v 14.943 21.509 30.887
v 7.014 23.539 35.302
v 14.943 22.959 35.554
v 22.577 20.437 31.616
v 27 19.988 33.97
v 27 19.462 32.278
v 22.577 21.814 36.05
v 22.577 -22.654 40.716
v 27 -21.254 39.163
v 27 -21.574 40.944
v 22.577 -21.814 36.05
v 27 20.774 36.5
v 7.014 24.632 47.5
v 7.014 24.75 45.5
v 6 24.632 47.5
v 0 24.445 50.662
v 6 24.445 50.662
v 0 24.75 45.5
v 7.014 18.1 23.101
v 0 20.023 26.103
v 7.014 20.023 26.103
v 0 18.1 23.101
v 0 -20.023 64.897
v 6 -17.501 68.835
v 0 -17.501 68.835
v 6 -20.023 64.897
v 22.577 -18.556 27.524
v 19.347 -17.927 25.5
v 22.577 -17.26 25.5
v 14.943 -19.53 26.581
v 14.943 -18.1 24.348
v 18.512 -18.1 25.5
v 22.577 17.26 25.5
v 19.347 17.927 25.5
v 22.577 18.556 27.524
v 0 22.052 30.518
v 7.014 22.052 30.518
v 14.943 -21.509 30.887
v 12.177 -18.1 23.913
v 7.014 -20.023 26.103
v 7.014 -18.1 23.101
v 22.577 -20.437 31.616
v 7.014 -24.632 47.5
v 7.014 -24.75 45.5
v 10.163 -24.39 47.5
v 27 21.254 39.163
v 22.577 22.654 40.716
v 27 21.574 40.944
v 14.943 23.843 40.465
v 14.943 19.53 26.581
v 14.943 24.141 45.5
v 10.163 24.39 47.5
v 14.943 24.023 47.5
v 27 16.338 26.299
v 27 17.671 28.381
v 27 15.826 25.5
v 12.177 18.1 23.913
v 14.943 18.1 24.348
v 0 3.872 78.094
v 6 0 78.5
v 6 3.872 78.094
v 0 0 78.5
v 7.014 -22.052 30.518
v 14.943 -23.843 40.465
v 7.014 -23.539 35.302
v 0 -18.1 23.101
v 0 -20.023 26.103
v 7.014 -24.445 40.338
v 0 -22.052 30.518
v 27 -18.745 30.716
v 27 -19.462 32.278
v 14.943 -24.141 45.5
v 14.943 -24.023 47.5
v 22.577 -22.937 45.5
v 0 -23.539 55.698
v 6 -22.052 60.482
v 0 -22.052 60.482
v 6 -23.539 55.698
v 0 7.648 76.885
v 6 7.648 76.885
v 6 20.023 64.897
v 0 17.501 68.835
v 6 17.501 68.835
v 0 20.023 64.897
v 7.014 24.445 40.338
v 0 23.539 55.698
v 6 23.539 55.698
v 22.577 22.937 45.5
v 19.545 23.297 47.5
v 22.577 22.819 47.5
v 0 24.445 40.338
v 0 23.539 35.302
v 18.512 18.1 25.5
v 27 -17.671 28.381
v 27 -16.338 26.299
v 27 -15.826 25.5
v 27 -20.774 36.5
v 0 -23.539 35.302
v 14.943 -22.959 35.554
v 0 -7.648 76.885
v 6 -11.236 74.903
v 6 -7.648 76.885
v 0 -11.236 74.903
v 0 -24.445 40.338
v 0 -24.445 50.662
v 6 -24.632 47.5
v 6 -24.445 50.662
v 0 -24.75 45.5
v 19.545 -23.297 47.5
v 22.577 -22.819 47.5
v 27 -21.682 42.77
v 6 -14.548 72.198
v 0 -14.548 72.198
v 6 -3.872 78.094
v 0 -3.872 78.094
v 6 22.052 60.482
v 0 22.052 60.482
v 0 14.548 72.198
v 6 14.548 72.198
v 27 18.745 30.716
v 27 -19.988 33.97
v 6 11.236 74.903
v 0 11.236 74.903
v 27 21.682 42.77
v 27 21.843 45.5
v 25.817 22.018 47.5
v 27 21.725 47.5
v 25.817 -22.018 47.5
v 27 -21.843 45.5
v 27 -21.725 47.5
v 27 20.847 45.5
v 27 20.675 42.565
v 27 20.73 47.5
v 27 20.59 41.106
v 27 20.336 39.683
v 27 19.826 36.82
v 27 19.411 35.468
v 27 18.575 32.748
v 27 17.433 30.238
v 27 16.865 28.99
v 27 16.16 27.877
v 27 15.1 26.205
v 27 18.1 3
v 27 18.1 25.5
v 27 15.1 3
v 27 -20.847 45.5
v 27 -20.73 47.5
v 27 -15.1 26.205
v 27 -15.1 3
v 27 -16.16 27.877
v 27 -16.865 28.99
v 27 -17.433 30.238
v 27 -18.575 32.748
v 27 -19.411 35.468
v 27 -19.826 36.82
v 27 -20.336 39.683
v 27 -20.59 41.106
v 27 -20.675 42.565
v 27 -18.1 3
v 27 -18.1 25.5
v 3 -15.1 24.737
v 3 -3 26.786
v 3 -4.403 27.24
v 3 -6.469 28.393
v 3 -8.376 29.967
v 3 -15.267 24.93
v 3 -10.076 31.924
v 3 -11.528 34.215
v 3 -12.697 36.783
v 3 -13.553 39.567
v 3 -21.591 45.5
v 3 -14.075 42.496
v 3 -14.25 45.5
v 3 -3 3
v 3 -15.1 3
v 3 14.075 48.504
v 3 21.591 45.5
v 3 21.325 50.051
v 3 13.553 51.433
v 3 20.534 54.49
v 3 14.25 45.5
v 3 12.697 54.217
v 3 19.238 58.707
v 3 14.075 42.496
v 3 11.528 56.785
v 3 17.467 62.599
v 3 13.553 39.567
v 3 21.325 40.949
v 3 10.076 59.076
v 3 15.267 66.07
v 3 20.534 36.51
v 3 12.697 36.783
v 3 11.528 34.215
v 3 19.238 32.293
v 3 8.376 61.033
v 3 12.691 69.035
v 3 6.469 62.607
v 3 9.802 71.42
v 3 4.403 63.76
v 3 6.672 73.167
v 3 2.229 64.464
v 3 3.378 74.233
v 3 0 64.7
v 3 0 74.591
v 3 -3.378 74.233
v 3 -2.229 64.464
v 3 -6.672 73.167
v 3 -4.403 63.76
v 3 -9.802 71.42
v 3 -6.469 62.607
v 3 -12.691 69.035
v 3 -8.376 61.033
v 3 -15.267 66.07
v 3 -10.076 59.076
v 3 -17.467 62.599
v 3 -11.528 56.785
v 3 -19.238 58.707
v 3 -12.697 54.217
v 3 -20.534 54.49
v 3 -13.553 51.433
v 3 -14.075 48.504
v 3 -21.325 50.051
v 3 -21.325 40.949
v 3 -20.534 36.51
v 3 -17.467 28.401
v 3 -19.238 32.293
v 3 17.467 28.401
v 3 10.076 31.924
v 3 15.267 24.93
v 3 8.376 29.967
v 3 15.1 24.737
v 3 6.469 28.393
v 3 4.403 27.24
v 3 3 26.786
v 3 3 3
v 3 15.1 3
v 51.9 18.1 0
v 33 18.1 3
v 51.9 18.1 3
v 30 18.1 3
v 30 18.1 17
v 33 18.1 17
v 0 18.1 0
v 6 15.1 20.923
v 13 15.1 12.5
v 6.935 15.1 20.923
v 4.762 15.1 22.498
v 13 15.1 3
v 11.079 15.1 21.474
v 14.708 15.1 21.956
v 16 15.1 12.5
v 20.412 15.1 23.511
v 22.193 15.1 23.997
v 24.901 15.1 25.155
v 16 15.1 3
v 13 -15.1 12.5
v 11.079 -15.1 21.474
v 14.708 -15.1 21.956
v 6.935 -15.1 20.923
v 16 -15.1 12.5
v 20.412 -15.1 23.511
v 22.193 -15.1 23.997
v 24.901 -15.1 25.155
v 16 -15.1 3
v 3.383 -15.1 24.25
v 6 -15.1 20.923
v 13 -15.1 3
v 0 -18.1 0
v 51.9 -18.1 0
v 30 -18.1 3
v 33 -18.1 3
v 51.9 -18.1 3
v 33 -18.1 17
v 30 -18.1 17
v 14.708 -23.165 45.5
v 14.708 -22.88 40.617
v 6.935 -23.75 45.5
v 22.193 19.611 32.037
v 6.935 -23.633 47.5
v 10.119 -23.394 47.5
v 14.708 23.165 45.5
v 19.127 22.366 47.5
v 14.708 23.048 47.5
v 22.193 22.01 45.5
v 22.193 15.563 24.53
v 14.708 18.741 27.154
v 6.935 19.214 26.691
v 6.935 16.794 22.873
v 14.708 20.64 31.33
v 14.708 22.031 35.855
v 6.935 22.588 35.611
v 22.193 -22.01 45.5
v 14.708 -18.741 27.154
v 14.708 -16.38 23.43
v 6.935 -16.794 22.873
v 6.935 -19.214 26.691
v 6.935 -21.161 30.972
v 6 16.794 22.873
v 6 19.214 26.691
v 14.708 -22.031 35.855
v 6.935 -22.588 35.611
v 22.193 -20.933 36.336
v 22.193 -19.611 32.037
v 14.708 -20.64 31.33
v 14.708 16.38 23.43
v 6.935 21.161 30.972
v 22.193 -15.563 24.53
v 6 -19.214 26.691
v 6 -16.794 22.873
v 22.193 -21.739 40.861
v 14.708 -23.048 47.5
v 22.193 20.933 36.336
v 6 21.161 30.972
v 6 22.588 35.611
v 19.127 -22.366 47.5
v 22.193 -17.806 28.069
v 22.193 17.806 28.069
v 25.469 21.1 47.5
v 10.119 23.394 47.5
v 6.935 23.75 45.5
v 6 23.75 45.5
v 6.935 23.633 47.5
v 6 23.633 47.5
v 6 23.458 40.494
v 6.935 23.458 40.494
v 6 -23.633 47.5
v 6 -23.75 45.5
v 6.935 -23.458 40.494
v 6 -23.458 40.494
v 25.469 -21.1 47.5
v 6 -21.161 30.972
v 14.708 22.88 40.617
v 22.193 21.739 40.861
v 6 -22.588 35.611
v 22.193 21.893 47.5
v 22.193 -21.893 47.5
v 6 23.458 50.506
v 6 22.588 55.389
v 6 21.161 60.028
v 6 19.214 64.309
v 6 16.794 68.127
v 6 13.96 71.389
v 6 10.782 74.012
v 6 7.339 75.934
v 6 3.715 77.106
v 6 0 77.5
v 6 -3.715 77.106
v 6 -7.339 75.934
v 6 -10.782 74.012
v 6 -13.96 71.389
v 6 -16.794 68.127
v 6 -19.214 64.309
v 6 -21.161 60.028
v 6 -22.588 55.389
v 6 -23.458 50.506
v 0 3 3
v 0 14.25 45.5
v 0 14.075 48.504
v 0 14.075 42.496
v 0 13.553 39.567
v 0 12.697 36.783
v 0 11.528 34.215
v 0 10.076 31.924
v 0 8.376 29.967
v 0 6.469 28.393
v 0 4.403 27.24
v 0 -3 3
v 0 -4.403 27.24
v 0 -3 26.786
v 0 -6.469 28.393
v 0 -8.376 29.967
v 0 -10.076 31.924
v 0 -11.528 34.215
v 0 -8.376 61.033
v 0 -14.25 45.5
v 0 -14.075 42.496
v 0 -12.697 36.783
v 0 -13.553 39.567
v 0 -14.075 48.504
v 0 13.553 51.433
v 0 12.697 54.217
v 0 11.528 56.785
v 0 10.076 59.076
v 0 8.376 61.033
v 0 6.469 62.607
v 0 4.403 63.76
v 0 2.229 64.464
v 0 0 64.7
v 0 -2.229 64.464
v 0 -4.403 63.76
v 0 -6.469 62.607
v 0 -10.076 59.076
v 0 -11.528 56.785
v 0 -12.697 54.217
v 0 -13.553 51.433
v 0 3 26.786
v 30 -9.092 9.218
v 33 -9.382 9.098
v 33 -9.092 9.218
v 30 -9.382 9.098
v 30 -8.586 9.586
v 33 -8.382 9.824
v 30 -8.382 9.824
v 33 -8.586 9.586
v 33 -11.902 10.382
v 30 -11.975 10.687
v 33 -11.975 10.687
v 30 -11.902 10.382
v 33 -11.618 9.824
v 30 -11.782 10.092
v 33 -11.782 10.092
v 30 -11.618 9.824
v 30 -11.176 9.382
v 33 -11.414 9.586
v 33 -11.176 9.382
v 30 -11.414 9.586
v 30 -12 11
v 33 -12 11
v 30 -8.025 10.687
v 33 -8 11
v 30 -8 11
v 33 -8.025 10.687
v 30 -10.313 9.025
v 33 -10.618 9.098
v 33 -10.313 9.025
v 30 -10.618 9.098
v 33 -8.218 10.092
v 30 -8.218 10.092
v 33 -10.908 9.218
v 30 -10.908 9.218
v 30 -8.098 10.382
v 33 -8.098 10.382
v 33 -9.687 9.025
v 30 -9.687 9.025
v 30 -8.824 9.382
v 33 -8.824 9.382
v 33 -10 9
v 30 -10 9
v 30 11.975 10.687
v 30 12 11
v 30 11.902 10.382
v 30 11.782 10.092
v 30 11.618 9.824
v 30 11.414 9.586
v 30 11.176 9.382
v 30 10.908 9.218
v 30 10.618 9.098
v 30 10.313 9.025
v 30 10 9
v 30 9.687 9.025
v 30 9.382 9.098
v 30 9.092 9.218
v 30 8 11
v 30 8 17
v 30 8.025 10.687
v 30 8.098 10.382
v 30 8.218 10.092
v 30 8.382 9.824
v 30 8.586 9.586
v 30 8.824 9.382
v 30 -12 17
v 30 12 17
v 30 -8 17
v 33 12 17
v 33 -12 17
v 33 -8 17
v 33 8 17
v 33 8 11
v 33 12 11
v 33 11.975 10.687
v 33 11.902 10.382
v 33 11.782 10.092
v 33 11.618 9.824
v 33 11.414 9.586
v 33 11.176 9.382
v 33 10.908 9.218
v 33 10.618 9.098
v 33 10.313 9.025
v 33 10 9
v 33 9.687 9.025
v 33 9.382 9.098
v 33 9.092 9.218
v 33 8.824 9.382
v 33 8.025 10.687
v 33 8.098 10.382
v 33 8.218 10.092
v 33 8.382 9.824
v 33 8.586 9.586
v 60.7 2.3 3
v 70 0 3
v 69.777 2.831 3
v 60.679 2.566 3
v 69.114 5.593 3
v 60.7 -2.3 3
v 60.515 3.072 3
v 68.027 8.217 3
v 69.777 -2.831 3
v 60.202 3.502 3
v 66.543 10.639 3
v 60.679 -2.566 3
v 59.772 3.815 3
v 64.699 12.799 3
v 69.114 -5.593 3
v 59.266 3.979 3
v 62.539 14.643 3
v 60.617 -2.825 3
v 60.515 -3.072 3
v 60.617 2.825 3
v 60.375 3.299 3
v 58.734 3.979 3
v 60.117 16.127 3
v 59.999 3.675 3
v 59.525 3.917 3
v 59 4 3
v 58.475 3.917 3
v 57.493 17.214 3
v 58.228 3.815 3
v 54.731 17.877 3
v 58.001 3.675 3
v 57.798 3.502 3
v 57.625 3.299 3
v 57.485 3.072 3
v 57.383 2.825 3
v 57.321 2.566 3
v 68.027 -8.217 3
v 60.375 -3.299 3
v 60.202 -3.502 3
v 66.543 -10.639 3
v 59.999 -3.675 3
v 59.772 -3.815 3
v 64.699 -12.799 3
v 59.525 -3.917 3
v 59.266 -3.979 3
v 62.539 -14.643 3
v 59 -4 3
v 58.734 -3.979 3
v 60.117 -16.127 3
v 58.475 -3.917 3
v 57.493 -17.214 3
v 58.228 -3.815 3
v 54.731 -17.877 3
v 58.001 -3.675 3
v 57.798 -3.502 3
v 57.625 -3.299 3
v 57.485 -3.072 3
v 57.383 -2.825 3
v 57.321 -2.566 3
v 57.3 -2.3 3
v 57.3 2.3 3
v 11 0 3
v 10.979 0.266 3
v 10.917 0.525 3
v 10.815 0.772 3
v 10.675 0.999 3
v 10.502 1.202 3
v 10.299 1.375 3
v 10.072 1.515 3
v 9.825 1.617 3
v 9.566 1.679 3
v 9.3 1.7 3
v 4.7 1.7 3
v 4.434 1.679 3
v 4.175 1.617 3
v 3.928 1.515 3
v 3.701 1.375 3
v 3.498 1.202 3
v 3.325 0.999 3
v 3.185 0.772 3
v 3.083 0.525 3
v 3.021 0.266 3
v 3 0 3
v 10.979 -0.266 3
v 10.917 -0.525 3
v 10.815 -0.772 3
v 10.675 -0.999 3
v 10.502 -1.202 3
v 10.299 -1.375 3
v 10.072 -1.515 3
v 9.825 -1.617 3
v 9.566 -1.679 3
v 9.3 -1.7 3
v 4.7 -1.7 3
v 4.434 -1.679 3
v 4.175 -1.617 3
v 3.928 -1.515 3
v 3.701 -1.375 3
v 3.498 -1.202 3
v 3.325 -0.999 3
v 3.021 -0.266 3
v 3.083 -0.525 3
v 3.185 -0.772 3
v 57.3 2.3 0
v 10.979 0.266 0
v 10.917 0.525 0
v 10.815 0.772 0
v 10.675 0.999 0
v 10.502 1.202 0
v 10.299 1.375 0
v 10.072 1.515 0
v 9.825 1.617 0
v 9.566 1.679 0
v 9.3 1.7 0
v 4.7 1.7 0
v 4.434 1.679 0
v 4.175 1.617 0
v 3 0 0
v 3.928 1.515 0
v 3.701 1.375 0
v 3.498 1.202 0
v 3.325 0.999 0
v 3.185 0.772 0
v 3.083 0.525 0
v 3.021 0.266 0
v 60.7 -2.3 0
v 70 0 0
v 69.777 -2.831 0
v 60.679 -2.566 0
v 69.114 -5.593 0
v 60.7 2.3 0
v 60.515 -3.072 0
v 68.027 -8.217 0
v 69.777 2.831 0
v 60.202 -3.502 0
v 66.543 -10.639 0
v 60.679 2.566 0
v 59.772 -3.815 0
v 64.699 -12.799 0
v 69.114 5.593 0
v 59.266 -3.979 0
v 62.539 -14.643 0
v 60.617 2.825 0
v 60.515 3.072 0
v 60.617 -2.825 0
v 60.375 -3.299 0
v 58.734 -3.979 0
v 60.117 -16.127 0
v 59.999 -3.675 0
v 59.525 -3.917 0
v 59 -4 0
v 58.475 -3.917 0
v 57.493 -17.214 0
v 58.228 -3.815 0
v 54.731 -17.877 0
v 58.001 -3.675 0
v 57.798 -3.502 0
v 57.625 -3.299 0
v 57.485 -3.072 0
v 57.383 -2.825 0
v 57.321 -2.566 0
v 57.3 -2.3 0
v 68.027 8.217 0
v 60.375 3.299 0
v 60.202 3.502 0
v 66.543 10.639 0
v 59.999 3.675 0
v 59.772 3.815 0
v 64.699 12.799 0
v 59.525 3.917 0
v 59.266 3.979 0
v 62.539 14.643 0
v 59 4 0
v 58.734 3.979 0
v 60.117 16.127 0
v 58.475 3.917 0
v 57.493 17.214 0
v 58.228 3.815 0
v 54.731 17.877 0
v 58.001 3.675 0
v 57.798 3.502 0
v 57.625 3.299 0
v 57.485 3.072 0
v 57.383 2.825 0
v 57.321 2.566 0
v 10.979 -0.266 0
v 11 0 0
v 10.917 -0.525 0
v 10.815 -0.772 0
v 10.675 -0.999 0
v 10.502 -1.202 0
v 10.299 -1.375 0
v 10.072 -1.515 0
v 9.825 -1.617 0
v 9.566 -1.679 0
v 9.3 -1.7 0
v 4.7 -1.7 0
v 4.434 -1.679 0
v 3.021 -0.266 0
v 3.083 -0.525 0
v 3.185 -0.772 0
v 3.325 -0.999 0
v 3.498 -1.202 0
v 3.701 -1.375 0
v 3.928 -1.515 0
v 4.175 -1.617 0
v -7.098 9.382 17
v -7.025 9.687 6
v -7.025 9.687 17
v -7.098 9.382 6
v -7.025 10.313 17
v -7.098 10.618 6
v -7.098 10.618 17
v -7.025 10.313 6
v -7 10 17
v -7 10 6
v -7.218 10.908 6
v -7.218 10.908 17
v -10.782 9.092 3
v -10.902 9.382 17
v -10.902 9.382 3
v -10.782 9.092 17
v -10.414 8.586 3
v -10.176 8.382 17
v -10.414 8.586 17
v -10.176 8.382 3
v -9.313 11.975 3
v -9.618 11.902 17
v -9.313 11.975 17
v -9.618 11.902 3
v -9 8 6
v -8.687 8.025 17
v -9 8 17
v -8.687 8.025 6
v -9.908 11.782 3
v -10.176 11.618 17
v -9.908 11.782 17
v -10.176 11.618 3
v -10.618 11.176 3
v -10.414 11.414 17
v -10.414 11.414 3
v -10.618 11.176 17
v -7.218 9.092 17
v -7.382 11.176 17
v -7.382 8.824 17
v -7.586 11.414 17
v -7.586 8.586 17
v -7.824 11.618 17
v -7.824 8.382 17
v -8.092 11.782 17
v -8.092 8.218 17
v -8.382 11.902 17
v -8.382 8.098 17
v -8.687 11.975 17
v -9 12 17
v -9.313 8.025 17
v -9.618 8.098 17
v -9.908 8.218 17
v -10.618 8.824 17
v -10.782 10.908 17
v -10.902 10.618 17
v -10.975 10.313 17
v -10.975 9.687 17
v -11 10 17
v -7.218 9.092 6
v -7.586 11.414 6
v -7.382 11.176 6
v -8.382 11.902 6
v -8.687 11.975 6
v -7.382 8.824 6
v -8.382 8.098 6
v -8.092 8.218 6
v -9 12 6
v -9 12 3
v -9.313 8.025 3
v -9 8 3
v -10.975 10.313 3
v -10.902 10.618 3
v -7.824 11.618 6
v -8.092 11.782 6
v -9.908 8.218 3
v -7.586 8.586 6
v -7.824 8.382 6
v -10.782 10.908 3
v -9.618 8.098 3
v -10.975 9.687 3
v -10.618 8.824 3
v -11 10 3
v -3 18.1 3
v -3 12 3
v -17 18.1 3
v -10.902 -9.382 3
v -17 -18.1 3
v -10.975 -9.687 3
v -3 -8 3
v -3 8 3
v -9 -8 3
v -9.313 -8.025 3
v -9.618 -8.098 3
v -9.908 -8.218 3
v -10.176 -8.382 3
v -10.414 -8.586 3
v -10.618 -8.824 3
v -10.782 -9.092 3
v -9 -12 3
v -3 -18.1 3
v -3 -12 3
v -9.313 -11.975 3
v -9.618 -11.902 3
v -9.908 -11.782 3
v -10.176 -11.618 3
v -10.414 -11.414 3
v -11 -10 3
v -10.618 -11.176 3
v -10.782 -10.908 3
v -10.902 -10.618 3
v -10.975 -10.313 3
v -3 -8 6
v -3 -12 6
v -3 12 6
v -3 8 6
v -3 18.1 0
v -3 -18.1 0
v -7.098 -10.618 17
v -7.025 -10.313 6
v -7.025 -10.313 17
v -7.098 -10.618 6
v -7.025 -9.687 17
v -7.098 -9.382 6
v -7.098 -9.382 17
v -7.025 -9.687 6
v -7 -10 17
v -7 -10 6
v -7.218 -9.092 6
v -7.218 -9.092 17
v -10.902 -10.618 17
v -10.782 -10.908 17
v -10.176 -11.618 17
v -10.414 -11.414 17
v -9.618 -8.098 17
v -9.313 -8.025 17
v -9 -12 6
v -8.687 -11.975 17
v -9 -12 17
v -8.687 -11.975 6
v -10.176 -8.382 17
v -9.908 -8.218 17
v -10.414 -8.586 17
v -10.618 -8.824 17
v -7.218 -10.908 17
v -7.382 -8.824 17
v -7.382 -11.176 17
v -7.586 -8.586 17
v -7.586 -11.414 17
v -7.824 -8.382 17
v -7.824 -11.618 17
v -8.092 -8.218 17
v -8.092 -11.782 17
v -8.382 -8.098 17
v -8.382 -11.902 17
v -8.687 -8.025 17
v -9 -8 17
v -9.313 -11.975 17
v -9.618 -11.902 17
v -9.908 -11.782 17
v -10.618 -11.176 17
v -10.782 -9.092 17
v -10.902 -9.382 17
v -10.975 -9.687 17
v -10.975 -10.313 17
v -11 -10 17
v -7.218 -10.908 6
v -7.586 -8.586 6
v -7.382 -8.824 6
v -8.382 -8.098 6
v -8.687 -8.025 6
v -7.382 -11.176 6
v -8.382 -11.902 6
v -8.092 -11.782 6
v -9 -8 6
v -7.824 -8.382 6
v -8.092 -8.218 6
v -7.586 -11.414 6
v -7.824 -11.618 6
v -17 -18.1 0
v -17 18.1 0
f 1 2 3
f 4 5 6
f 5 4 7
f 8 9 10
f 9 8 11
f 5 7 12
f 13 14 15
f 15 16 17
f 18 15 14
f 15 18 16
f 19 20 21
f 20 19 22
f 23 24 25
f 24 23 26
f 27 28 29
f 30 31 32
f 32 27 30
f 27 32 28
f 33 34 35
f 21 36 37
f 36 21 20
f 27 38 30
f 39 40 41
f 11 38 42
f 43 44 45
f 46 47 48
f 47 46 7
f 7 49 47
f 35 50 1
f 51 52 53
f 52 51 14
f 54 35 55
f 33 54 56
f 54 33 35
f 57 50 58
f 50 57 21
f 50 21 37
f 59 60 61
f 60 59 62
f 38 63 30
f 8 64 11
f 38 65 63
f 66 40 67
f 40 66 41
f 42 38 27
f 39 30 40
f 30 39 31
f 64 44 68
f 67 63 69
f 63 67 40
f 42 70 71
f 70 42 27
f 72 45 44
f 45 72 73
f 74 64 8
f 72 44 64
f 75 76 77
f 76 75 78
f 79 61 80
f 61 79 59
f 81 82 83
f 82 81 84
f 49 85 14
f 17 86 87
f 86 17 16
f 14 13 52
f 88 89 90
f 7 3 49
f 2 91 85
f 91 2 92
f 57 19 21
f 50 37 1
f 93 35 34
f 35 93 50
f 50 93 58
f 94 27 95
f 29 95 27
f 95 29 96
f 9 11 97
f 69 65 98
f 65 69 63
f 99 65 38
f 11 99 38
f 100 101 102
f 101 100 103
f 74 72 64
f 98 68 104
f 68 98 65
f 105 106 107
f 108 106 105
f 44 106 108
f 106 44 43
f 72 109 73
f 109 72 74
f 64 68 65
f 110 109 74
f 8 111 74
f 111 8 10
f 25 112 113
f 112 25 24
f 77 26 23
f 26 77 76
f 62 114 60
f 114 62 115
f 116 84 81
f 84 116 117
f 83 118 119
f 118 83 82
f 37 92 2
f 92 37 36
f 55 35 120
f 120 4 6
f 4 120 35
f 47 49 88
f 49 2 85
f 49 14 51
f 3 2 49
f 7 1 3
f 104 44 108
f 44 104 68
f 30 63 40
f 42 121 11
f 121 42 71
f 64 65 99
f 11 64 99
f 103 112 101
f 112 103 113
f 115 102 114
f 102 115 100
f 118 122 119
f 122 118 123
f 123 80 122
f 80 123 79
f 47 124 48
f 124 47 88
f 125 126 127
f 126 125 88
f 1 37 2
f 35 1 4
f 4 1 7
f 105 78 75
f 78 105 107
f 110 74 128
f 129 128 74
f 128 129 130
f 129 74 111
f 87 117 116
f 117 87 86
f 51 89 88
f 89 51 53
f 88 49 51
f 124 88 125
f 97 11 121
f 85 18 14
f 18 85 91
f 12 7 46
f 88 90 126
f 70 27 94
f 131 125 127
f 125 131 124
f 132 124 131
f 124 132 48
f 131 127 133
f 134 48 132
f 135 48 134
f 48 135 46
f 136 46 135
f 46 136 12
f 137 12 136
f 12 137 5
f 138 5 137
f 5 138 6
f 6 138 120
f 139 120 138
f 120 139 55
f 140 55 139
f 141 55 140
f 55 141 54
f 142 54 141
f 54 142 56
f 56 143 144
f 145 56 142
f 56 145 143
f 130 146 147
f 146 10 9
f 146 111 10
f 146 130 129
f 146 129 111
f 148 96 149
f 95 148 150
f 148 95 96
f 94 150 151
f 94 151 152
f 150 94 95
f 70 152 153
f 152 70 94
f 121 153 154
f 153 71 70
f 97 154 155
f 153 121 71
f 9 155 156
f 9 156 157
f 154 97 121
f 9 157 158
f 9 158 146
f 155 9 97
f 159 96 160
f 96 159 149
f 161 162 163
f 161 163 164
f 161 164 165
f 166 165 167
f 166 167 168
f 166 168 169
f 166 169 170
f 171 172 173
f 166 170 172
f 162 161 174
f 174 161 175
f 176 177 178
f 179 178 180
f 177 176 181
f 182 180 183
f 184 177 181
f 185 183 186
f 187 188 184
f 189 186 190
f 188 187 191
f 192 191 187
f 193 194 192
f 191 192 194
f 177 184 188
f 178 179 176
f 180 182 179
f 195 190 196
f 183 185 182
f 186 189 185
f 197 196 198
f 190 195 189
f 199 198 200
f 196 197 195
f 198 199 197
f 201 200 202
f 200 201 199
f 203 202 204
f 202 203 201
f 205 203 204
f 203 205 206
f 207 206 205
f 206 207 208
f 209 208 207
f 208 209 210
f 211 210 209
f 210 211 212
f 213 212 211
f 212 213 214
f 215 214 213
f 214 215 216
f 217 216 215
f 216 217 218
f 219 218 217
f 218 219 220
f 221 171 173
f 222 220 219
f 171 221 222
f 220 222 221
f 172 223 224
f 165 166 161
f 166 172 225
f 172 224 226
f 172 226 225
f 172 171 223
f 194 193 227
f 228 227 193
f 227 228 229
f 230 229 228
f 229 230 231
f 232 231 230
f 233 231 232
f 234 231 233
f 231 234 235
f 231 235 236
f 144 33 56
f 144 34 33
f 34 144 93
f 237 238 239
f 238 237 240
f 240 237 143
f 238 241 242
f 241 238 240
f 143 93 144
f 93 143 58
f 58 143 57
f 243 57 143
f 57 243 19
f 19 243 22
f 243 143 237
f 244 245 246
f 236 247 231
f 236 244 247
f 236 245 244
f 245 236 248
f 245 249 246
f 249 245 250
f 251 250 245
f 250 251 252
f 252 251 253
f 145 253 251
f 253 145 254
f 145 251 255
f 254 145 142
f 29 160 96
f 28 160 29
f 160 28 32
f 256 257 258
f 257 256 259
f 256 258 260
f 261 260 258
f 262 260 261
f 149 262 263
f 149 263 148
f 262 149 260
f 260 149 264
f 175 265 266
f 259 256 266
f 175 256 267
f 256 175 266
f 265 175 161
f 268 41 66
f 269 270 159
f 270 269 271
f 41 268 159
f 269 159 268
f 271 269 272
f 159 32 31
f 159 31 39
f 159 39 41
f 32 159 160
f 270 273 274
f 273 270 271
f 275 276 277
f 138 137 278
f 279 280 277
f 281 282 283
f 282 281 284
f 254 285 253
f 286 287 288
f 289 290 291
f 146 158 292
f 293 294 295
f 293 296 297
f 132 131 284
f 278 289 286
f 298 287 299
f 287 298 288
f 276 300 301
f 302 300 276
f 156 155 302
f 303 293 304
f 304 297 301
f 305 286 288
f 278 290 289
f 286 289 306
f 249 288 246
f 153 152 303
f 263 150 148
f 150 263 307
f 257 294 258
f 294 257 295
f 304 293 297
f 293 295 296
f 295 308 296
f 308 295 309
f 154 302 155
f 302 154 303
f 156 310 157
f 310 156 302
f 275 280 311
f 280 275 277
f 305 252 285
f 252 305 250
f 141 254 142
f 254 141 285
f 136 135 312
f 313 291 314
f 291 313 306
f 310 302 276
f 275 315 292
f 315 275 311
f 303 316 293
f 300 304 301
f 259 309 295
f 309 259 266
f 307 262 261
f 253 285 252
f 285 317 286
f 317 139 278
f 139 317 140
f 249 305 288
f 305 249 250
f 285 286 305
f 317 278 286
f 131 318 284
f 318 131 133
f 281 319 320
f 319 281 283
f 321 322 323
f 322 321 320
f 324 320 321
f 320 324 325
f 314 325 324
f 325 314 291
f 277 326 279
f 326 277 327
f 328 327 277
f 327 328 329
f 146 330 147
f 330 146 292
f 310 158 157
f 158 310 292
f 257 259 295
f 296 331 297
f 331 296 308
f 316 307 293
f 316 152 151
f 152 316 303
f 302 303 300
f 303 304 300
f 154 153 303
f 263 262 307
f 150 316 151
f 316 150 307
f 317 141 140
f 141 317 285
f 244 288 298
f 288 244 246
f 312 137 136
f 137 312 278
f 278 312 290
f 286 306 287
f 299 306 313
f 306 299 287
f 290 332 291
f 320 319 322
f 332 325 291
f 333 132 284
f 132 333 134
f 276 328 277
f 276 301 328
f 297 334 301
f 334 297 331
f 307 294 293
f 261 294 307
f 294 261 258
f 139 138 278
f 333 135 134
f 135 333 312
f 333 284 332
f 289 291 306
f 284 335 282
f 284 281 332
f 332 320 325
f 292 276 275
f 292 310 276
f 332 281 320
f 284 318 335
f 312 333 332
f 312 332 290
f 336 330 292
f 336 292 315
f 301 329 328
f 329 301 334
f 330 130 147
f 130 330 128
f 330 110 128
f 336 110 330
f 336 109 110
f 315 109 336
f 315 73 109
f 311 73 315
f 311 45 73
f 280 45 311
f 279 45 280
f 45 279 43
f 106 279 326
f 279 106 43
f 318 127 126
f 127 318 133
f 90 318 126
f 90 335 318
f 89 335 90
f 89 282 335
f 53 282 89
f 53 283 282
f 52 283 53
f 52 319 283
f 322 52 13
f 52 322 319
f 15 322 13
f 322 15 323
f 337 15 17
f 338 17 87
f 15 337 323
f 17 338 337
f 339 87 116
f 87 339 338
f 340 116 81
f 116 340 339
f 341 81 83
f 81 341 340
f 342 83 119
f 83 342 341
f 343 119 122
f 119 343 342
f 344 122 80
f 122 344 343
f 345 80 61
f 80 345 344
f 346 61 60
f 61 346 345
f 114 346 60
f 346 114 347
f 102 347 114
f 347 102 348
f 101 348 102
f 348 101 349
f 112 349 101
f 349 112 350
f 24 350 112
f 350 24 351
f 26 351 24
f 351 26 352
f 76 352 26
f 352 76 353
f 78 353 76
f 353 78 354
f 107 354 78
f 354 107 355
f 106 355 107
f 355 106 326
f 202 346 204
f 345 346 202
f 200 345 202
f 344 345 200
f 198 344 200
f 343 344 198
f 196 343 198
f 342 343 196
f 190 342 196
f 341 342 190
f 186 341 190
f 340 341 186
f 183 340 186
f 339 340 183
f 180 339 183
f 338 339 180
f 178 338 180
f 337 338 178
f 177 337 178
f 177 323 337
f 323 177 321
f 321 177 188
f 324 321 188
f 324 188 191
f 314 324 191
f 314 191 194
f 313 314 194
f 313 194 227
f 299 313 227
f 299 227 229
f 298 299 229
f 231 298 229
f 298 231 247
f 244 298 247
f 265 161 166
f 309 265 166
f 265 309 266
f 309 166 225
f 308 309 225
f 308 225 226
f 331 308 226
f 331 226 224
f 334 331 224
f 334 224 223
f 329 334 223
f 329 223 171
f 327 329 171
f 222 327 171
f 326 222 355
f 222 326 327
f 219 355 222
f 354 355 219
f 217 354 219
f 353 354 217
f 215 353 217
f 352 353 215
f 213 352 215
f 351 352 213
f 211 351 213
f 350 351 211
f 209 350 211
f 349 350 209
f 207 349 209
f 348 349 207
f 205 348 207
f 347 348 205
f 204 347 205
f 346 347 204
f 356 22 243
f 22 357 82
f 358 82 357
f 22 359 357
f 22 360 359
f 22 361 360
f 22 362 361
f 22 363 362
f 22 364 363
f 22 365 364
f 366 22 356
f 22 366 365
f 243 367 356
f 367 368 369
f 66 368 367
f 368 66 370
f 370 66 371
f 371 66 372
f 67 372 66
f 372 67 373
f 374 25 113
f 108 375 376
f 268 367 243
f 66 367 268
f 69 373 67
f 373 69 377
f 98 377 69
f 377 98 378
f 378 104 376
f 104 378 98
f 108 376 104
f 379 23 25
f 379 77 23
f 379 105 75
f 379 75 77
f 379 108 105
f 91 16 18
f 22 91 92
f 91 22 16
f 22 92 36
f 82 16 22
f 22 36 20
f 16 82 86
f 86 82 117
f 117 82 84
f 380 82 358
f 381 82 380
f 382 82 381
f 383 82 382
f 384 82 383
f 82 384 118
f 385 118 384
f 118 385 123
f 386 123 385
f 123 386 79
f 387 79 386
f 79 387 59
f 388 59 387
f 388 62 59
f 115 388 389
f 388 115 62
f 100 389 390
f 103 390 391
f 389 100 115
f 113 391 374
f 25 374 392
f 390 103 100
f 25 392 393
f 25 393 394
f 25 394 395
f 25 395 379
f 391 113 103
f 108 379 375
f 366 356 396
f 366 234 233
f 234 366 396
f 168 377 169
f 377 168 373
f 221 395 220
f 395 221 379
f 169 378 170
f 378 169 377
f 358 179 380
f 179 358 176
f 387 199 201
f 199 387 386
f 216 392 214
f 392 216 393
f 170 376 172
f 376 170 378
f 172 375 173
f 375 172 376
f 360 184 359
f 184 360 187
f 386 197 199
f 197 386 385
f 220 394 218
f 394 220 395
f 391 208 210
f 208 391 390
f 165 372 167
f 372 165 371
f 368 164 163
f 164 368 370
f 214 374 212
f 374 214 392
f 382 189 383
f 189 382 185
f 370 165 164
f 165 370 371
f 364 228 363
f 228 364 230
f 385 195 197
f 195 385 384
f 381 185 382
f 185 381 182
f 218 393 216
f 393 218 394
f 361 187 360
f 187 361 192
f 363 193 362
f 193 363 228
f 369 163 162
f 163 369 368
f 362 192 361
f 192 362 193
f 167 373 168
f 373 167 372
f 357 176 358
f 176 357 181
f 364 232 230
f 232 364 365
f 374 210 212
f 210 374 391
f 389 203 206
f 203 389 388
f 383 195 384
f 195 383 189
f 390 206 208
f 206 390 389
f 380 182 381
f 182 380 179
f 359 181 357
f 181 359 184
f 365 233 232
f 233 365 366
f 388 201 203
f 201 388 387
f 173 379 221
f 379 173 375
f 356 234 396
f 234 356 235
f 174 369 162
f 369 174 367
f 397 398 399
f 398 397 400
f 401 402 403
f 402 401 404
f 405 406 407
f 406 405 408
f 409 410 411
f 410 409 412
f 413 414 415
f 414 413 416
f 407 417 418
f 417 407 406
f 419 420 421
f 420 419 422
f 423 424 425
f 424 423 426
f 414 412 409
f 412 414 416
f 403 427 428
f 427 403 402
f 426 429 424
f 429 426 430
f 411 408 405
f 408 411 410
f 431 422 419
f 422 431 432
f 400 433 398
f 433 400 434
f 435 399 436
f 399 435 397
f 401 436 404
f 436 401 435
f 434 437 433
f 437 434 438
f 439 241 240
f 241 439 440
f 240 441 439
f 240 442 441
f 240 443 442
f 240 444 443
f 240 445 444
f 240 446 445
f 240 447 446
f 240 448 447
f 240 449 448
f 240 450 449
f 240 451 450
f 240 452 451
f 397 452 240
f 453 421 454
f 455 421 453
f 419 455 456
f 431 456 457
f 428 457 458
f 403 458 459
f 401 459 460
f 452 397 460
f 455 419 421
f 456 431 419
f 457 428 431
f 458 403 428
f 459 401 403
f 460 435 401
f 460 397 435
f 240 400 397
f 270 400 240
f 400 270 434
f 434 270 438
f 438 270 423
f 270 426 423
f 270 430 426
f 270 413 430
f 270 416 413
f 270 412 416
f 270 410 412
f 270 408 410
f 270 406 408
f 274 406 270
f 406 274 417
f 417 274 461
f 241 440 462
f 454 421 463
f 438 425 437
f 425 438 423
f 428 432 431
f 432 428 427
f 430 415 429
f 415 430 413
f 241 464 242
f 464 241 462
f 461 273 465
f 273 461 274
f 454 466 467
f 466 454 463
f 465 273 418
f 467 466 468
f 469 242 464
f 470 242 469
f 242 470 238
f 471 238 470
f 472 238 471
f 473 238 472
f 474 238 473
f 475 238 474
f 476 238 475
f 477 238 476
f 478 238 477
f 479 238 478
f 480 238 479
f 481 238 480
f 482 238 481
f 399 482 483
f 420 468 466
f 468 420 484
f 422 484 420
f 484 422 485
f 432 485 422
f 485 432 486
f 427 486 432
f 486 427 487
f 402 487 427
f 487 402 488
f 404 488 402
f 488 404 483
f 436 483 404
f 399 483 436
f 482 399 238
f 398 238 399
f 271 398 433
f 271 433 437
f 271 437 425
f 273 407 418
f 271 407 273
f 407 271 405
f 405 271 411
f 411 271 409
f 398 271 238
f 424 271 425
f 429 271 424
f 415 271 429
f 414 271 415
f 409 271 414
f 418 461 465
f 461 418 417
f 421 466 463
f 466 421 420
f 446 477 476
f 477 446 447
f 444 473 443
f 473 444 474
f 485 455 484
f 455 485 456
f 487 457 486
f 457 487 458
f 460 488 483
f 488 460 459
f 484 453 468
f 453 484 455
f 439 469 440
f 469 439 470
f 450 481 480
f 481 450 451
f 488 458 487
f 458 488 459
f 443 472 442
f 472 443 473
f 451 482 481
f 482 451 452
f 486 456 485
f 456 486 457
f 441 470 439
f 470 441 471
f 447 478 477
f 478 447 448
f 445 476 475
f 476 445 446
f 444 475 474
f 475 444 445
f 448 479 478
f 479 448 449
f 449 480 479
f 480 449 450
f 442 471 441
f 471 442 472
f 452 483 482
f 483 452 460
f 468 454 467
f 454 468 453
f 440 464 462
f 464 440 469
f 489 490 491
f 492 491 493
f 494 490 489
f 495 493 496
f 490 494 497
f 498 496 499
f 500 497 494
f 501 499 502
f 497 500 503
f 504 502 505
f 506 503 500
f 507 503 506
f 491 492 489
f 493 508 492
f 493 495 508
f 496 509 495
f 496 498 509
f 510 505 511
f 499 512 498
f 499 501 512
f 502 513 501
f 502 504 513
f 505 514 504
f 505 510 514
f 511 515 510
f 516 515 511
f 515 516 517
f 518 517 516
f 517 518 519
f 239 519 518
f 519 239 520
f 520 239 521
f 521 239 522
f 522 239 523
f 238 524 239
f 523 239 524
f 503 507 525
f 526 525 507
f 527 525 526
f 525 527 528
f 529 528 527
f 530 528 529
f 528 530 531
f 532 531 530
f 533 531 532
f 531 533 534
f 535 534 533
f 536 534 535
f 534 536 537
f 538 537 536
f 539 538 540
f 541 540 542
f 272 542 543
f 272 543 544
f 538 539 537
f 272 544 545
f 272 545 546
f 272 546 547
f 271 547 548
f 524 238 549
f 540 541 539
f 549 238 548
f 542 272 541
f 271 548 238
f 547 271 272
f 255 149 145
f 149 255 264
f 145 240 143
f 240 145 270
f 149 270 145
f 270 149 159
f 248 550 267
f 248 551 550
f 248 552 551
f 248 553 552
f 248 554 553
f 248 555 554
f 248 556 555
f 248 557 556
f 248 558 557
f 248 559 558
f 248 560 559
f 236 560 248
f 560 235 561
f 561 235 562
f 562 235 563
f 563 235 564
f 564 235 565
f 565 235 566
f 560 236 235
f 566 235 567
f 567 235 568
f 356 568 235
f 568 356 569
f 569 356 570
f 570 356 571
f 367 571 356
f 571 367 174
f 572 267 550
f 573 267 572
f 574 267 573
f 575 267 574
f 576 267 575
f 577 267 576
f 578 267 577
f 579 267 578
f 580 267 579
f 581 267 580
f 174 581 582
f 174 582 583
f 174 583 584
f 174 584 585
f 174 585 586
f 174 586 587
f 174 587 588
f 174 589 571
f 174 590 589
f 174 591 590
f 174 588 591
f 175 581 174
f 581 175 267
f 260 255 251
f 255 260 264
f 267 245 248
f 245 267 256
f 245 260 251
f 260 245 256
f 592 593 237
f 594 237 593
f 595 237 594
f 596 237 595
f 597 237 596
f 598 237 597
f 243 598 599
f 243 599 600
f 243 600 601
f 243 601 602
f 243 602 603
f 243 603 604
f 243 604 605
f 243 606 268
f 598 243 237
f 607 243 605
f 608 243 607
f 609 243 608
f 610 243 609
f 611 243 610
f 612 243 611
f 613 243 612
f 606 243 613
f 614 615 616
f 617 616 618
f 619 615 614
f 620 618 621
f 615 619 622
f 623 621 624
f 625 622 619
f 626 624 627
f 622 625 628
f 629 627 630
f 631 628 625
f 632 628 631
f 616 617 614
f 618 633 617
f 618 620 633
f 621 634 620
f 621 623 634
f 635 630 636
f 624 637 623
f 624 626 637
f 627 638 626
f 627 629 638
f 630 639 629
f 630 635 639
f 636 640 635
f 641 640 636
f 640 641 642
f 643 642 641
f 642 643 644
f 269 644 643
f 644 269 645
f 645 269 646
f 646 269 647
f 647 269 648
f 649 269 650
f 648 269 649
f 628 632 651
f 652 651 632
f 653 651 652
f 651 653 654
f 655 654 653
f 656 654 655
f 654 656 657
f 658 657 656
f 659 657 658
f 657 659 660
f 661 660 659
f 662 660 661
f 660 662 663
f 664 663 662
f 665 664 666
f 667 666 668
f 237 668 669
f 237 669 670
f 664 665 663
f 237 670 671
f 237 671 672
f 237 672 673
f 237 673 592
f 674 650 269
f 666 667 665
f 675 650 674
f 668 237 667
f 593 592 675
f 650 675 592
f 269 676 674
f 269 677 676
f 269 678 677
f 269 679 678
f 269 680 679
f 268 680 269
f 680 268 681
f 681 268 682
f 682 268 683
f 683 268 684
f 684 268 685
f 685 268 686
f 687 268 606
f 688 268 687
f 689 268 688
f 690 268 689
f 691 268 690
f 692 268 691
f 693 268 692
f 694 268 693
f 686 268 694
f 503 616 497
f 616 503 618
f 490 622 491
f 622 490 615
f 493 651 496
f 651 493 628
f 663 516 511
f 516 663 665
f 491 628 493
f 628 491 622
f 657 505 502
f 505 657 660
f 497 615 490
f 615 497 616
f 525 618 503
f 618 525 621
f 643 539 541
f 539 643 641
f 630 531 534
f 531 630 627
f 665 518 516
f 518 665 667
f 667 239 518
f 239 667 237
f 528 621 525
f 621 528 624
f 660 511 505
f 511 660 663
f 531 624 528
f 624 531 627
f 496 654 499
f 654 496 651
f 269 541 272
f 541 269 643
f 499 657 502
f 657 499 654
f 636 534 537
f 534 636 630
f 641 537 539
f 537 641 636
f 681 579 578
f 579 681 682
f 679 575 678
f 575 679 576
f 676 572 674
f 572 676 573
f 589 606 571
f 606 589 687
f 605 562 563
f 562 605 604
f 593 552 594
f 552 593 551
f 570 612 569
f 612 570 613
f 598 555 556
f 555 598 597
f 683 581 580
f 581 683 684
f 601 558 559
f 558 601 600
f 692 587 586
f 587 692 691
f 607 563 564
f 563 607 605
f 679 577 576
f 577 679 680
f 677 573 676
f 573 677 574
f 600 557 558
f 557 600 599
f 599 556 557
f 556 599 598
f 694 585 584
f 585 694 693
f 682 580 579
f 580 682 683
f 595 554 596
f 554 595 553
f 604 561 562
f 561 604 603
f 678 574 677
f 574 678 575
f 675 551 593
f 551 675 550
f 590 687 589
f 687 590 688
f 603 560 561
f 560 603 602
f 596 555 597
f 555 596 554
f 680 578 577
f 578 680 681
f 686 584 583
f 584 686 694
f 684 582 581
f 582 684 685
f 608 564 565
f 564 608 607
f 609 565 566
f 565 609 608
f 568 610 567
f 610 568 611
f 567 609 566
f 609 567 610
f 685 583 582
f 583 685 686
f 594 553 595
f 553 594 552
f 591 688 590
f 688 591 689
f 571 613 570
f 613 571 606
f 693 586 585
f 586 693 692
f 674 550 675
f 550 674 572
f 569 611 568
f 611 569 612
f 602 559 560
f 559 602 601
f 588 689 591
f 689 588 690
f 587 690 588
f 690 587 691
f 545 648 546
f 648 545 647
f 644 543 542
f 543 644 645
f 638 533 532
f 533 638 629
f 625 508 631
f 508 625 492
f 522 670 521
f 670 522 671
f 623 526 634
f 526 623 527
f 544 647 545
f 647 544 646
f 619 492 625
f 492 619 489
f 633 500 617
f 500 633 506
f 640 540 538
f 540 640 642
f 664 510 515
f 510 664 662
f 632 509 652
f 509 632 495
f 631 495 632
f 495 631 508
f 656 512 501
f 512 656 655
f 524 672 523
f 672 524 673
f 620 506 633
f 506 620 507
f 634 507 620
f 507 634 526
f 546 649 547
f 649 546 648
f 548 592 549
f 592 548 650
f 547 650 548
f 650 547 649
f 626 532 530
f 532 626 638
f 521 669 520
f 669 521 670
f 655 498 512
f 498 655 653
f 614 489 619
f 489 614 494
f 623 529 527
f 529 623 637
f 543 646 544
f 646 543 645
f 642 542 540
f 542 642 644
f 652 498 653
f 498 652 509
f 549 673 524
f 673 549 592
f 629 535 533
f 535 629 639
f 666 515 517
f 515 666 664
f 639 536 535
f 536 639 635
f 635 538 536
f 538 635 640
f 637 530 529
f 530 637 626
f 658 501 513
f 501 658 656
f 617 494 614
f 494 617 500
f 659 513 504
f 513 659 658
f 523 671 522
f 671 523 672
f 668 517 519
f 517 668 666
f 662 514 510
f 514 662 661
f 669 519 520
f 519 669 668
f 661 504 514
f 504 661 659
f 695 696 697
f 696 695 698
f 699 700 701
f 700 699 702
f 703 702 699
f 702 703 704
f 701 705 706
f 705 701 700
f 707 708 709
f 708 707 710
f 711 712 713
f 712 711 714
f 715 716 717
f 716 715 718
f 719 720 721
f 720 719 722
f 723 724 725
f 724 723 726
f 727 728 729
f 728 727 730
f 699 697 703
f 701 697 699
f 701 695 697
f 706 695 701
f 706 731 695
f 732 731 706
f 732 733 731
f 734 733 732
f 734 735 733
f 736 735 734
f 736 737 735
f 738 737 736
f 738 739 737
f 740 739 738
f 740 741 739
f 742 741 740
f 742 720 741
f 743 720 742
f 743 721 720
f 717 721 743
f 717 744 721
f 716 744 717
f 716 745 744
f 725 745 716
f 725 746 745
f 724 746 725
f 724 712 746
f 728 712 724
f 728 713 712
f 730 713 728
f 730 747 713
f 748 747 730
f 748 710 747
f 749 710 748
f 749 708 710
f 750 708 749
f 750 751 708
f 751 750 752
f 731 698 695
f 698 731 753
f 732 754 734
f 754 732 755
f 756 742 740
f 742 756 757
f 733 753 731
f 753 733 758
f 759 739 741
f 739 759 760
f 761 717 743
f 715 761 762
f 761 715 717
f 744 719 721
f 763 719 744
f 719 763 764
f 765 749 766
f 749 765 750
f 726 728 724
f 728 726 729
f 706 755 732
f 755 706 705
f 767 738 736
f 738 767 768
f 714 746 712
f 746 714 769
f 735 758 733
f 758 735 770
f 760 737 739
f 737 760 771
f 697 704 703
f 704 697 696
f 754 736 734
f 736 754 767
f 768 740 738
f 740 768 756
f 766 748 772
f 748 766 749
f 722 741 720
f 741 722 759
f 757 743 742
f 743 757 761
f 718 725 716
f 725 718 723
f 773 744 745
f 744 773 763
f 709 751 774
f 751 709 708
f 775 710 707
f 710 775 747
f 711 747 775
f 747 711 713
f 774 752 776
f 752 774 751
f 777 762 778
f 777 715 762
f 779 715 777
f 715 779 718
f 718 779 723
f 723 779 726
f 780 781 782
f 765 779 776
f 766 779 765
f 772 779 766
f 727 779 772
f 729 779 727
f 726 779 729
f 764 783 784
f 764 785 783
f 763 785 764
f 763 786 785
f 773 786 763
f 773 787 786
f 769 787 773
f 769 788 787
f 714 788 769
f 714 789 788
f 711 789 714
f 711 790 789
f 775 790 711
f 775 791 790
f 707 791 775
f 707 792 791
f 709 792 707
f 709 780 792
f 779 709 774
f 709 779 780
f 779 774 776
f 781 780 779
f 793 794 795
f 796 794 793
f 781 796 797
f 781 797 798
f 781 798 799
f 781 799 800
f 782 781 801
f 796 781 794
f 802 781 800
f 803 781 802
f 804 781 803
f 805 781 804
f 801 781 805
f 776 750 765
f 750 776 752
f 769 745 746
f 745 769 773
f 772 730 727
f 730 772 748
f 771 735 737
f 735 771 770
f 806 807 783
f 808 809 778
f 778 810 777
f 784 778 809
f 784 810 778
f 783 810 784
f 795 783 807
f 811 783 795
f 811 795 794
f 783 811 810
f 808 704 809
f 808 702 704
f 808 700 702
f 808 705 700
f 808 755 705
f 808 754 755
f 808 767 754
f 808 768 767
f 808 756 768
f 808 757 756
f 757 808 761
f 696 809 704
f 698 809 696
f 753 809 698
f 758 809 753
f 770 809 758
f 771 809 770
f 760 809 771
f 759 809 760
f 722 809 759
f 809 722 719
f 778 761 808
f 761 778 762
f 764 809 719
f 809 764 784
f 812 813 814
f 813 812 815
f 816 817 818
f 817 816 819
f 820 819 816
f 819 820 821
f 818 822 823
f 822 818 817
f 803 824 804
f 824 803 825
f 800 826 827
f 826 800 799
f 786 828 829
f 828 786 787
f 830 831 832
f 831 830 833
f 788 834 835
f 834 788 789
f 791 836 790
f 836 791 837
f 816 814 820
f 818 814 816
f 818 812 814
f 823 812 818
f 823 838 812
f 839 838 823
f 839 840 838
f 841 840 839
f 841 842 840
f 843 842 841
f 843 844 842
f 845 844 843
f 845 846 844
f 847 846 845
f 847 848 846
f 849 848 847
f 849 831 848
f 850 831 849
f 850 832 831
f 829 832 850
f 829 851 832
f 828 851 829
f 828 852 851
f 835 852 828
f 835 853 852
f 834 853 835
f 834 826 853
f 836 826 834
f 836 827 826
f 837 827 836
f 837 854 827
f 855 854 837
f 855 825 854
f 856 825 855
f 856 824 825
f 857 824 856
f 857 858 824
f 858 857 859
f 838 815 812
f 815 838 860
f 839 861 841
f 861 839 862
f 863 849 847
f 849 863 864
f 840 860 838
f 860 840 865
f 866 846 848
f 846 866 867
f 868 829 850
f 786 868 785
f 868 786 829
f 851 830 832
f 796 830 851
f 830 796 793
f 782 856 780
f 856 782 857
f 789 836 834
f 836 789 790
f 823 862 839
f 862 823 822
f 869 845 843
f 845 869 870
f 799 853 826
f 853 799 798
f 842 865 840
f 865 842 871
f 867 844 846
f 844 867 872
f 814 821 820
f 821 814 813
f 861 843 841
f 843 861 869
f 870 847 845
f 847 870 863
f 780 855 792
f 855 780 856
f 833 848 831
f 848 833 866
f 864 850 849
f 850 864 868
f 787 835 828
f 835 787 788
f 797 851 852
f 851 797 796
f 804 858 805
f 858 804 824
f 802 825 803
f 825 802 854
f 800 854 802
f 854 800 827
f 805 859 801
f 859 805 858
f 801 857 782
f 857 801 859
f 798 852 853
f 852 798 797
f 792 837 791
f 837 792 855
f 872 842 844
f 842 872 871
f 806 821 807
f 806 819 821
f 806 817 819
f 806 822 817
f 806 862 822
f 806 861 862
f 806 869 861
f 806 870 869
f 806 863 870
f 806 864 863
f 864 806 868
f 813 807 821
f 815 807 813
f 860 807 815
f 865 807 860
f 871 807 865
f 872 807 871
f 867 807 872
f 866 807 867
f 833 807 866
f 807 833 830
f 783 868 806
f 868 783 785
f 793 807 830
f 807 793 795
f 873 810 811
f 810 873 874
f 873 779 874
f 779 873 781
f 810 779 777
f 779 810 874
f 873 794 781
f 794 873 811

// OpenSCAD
h=24;
l=64;
b=47.5;
r=50;
holderThickness=2;
baseThickness=3;
backPowerWidth=30.2;
baseBackSquareLength=24;
powerCableWidth=6;
powerCableHeight=3.5;
backPlateZ=70;
backPlateY=backPowerWidth+2*baseThickness;
backPlateX=20;
brushHolderR=2;
brushHolderH=14;

faces=40;
$fn=faces;


module holderSphere() {
  difference() {
    union() {
      difference() {
        union() {
          resize([l+holderThickness,b+holderThickness,r*2+holderThickness]) sphere(r = 100, $fn=faces);
          translate([l/2,backPowerWidth/2+baseThickness/2,h/2]) cube([baseBackSquareLength,baseThickness,h], center=true);
          translate([l/2,-backPowerWidth/2-baseThickness/2,h/2]) cube([baseBackSquareLength,baseThickness,h], center=true);
        }
        resize([l,b,r*2])  sphere(r = 100, $fn=faces);
        translate([0,0,-50]) cube([100,100,100], center=true);
        translate([0,0,50+h]) cube([100,100,100], center=true);
        translate([-52,0,50+baseThickness]) cube([100,100,100],center=true);
      }
      resize([l,b,baseThickness]) rotate_extrude(convexity = 10) translate([10,0,0]) polygon( points=[[1,0],[0,0],[1,1]] );
    }
	 translate([100/2,0,h/2]) cube([100,backPowerWidth,h+2],center=true);
  }
}

module basePlate() {
  difference() {
    union() {
      resize([l+holderThickness,b+holderThickness,baseThickness]) cylinder(r = 100);
      translate([l/2,0,baseThickness/2]) cube([baseBackSquareLength,backPowerWidth+2*baseThickness,baseThickness], center=true);
    }
    translate([0,0,-1]) scale([0.6,0.6,2]) resize([l,b,baseThickness]) cylinder(r = 100);
    translate([l/2,0,baseThickness/2]) cube([baseBackSquareLength+5,powerCableWidth,100], center=true);
  }

  translate([l/2+13/2,0,10+baseThickness/2+baseThickness]) cube([baseBackSquareLength-13,backPowerWidth,baseThickness],center=true);

  difference() {
    translate([l/2+7/2,0,h+baseThickness/2+baseThickness*2]) cube([14,backPowerWidth+2*baseThickness,baseThickness],center=true);
    #translate([l/2+7/2,0,h+baseThickness/2+baseThickness]) rotate([0,0,180]) brushHolderPlate();
  }
}


module backPlate() {
  difference() {
    union() {
      translate([0,0,-backPlateY/4]) cube([baseThickness,backPlateY,backPlateZ-backPlateY/2],center=true);
      translate([0,0,backPlateZ/2-backPlateY/2]) rotate([0,90,0]) cylinder(r=backPlateY/2,h=baseThickness,center=true); 
	 } 
    translate([0,0,-2]) backPlateHoles();
  }
}

module backPlateHoles() {
  translate([-baseThickness/2-1,0,-26]) rotate([0,90,0]) backPlateHole();
  translate([-baseThickness/2-1,0,26]) rotate([90,0,90]) backPlateHole();
}

module backPlateHole() {
  hull() {
    translate([-4+1.7,0,0]) cylinder(r=1.7, h=baseThickness+2);
    translate([4-1.7,0,0]) cylinder(r=1.7, h=baseThickness+2);
  }
}

module brushHolder() {
  cylinder(r=brushHolderR, h=brushHolderH, center=true);
  translate([6/2,0,-brushHolderH/2+baseThickness/2]) cube([6,2*brushHolderR,baseThickness],center=true);
}

module brushHolderPlate() {
	cube([14,backPowerWidth+2*baseThickness,baseThickness],center=true);
   translate([1,10,brushHolderH/2+baseThickness/2]) brushHolder();
   translate([1,-10,brushHolderH/2+baseThickness/2]) brushHolder();
}


translate([0,0,l/2+baseBackSquareLength/2+baseThickness/2]) rotate([0,90,0]) union() {
    translate([0,0,baseThickness]) holderSphere();
    basePlate();
    translate([l/2+baseBackSquareLength/2,0,backPlateZ/2]) backPlate();
}

translate([-10,0,baseThickness/2]) brushHolderPlate();
